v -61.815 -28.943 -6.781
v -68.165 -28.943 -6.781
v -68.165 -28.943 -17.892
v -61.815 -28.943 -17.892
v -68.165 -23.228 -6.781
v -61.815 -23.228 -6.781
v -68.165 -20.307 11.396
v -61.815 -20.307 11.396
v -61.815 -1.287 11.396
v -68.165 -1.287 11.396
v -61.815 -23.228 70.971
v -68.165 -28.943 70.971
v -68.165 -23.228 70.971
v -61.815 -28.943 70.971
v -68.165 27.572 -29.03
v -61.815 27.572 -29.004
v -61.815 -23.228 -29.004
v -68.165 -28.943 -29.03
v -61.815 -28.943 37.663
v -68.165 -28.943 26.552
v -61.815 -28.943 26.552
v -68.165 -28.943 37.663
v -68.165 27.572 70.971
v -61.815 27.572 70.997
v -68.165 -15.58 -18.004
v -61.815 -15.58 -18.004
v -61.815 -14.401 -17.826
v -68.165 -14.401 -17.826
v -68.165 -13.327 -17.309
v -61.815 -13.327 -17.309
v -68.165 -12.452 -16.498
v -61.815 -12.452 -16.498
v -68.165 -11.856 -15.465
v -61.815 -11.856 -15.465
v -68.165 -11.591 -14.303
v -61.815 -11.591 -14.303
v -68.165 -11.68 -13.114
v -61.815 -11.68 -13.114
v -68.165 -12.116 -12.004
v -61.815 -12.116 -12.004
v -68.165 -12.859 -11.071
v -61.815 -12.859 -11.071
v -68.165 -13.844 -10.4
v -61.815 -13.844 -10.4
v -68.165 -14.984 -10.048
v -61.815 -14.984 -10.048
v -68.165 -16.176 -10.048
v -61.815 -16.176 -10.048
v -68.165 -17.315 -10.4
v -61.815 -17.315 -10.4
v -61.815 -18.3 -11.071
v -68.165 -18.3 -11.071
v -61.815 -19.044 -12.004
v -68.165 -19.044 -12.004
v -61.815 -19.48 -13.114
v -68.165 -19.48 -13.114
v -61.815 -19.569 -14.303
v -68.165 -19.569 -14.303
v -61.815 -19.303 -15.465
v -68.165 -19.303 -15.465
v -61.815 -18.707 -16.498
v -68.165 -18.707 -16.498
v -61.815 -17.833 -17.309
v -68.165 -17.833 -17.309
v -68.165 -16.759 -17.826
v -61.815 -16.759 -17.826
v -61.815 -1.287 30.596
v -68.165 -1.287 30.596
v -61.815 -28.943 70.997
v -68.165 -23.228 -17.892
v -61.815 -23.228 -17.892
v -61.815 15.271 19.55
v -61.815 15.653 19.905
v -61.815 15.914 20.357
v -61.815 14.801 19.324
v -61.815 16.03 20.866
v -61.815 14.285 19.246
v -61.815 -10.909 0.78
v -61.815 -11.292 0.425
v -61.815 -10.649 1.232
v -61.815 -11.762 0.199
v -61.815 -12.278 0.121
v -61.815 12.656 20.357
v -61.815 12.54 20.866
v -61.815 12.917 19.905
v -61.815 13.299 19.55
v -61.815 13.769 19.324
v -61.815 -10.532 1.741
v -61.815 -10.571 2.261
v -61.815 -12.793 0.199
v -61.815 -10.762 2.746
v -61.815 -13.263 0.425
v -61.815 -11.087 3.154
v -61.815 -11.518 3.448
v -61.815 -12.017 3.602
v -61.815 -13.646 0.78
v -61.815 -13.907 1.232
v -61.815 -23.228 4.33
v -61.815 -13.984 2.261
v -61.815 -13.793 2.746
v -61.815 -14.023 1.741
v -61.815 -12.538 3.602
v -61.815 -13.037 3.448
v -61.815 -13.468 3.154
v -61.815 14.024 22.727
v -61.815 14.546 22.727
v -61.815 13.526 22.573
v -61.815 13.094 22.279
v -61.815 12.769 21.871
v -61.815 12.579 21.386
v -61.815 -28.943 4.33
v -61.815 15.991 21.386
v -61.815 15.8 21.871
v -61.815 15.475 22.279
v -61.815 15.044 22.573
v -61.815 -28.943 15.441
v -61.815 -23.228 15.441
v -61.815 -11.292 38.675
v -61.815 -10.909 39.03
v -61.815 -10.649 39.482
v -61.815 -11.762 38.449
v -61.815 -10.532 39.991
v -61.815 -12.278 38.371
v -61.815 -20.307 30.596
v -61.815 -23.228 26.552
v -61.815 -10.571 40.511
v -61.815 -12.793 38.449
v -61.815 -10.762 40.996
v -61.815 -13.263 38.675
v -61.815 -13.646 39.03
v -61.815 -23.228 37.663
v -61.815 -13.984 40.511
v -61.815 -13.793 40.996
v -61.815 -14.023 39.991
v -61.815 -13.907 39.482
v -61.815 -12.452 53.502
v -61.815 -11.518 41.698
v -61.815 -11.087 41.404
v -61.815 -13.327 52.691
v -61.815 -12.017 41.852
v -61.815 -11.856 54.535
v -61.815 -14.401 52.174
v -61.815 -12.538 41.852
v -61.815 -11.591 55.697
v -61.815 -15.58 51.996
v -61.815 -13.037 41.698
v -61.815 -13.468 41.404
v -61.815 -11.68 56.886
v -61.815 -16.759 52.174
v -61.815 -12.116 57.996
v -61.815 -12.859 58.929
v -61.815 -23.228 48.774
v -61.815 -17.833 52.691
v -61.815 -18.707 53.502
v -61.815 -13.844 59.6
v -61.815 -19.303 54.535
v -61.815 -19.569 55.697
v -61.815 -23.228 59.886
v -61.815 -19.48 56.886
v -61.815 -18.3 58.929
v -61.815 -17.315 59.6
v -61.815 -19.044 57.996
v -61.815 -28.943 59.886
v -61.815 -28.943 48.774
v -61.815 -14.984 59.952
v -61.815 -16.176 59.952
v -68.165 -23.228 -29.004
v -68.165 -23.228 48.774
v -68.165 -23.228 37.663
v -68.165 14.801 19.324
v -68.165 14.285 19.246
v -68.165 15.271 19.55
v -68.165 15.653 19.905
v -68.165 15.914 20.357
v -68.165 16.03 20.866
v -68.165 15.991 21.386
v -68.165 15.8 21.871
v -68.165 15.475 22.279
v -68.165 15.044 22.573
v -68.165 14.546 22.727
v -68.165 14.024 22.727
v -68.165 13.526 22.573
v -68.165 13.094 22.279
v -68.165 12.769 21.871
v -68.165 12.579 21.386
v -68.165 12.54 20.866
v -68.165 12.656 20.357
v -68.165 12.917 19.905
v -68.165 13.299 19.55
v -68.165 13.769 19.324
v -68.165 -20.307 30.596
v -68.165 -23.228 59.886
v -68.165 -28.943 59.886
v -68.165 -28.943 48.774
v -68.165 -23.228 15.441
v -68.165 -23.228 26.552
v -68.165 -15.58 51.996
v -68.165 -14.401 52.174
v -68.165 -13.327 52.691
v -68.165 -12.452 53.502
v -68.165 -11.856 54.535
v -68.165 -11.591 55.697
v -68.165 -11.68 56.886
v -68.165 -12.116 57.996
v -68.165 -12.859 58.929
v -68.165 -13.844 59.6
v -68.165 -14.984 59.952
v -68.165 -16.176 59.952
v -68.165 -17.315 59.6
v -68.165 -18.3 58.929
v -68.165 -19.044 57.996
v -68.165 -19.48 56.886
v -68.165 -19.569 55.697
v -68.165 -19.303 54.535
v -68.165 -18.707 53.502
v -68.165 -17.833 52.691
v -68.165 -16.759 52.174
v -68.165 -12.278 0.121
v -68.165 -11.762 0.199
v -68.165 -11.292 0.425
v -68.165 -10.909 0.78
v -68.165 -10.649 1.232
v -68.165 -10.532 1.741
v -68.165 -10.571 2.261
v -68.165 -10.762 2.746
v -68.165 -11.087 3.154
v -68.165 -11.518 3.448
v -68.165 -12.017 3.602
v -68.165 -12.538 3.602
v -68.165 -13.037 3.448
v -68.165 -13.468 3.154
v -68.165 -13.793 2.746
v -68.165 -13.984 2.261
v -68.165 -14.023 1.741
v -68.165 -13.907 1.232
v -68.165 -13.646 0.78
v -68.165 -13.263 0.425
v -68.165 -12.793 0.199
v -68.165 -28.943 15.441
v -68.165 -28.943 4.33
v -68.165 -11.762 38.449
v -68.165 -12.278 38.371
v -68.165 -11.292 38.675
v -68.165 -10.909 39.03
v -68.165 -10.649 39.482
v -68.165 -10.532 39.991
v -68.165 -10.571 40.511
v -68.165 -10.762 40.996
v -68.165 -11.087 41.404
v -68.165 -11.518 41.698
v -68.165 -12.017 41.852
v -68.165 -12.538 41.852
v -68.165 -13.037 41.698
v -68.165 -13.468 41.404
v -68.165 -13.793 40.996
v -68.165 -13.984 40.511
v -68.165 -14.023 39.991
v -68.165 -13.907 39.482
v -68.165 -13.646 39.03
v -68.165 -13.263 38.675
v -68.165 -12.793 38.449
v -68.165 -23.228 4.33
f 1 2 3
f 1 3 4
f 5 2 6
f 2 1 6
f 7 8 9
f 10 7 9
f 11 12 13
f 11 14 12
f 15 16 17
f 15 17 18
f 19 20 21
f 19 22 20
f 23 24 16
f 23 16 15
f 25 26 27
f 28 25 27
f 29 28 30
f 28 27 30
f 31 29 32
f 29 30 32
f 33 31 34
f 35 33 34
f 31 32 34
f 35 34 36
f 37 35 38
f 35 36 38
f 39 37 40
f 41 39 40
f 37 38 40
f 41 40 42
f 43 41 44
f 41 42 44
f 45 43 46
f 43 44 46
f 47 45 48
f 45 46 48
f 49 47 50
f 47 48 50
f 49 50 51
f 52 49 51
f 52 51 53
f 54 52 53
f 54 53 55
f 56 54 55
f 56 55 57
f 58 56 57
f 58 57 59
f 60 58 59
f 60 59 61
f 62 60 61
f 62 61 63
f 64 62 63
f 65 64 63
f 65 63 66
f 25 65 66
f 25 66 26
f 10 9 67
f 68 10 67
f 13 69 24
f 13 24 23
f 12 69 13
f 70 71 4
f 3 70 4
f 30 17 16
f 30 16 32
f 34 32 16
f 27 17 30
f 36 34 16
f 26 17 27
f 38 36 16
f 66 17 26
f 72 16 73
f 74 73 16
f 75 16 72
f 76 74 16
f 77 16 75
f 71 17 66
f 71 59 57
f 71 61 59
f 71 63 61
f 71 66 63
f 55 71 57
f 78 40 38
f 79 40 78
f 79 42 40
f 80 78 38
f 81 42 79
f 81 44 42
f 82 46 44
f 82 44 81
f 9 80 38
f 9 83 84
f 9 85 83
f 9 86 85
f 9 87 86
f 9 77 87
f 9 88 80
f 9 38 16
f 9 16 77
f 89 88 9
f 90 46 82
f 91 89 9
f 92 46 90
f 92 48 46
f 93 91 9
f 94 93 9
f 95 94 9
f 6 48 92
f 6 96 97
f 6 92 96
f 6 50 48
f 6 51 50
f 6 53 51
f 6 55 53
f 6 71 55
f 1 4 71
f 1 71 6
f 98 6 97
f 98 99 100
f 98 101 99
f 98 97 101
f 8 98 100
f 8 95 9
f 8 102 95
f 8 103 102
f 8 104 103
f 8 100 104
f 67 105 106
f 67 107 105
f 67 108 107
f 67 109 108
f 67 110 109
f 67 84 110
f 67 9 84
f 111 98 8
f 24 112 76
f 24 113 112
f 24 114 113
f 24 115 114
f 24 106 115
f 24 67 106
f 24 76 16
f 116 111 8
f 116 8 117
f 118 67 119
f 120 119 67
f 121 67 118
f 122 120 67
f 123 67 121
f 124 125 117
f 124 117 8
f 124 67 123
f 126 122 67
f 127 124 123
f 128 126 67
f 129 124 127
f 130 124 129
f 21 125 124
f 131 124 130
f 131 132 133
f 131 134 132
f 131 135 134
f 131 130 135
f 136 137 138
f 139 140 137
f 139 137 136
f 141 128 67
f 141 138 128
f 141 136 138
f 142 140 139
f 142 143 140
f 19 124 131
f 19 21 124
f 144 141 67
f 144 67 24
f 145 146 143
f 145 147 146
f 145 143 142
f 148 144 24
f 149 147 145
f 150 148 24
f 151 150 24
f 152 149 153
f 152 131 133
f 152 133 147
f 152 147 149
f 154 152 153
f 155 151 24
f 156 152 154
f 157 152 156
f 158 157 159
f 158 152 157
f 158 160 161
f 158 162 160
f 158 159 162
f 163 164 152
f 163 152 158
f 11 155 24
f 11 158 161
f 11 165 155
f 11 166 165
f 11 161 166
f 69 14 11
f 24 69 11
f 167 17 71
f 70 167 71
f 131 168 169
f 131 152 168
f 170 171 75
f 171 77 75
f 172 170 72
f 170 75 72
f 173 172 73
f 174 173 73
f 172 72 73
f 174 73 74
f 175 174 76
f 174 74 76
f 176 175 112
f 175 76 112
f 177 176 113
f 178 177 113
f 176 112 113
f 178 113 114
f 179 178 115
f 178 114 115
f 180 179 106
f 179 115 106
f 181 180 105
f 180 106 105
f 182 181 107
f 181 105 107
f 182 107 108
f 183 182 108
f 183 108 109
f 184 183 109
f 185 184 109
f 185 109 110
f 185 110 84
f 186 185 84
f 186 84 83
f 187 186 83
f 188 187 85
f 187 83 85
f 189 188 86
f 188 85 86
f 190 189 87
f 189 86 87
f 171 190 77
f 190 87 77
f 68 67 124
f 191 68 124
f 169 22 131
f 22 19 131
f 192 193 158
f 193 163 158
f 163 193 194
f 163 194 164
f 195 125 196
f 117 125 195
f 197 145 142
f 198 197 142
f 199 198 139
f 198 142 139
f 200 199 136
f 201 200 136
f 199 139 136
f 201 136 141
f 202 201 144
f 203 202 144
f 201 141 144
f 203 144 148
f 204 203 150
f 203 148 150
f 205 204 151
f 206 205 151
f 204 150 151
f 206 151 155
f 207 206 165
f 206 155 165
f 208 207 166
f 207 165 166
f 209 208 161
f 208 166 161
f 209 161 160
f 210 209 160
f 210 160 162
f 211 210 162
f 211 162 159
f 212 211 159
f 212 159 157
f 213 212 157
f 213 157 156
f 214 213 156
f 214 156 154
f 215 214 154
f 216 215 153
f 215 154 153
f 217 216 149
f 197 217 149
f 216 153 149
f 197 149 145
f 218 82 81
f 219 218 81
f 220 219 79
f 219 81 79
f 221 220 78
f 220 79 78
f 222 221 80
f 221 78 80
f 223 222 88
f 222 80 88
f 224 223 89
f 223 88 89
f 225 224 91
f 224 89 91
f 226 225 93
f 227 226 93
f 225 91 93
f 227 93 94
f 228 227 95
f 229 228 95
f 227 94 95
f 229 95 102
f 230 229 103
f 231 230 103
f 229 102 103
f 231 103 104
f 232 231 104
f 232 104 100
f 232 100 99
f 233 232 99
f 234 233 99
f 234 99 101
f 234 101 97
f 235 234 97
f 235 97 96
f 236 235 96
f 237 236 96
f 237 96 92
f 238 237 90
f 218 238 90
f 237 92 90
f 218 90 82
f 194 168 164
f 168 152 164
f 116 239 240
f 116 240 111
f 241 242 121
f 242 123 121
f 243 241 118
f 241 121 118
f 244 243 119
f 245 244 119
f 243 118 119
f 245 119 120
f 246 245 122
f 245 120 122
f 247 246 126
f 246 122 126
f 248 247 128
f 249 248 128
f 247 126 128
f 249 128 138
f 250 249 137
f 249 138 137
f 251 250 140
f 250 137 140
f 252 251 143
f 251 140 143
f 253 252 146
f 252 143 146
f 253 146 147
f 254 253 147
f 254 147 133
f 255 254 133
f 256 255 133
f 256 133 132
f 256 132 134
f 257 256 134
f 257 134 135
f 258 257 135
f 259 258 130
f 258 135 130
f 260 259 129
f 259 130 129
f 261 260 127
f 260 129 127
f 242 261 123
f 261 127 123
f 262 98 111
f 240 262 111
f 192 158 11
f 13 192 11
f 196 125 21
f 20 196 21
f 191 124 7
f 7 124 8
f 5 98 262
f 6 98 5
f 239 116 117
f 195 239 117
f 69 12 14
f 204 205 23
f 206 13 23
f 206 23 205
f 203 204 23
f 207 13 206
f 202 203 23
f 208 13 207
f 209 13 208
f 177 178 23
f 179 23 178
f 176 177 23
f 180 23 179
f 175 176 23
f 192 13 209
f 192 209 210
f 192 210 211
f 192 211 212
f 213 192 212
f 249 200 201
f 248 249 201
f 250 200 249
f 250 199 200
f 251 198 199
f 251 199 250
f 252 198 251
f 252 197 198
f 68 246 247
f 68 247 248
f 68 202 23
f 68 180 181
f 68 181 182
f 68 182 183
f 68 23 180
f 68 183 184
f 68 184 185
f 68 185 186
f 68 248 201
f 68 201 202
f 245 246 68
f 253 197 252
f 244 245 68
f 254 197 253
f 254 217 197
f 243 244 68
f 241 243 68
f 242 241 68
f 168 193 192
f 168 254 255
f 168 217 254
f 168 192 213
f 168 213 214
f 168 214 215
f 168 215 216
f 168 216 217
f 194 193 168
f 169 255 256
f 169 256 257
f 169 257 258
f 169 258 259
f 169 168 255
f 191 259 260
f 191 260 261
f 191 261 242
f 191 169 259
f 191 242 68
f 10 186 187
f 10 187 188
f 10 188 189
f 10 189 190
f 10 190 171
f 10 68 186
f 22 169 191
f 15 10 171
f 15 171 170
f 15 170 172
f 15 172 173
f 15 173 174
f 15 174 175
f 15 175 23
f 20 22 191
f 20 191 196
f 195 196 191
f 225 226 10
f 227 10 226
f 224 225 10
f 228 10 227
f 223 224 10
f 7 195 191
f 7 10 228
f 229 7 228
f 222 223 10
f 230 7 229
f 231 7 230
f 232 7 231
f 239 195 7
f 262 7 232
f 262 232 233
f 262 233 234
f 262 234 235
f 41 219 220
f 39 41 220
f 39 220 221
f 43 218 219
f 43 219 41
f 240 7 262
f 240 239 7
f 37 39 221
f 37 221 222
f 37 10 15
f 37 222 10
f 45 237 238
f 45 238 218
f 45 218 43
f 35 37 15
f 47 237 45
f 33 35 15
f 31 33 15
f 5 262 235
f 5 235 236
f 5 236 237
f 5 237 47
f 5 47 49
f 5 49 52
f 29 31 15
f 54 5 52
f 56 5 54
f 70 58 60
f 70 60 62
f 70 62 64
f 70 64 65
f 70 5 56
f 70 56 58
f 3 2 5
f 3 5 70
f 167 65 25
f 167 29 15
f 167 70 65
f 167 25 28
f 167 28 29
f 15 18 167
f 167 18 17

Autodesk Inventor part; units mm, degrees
ref_plane "YZ Plane" through (0, 0, 0) normal (1, 0, 0) x (0, 1, 0)
ref_plane "XZ Plane" through (0, 0, 0) normal (0, 1, 0) x (-1, 0, 0)
ref_plane "Work Plane1" through (-108.8053, -23.2276, 20.9918) normal (0, 1, 0) x (-0.9999918, 0, -0.00406)
sketch "Sketch1" plane through (-108.8053, -23.2276, 20.9918) normal (0, 1, 0) x (-0.9999918, 0, -0.00406)
  line L0 (-46.787, -50.1863) -> (-47.193, 49.8137)
  line L1 (-47.193, 49.8137) -> (-40.843, 49.8137)
  line L2 (-46.787, -50.1863) -> (-40.437, -50.1863)
  line L3 (-46.787, -50.1863) -> (-40.437, -50.1863)
  line L4 (-40.843, 49.8137) -> (-40.437, -50.1863)
  line L5 (-47.193, 49.8137) -> (46.787, 50.1953) construction
  line L6 (-38.1849, 20.7247) -> (-38.1707, 17.2247)
  line L7 (-38.0296, -17.525) -> (-38.0154, -21.025)
  point P0 (-108.7192, -21.4334)
  dimension "d0" = 6.35
  dimension "d1" = 6.35
extrude "Extrusion1" add sketch "Sketch1" along normal blind 50.8 and the other way blind 6.35
sketch "Sketch2" plane through (-61.8149, -29.5776, 70.9967) normal (1, 0, 0) x (0, 0, -1)
  line L0 (100.0008, 0) -> (100.0008, 57.15) construction
  line L1 (0, 57.15) -> (100.0008, 57.15) construction
  line L2 (0, 0) -> (0, 57.15) construction
  line L3 (0, 57.15) -> (100.0008, 57.15) construction
  line L4 (50.0004, 57.15) -> (50.0004, 0) construction
  circle A0 centre (15.0004, 13.9978) radius 4
  circle A1 centre (85.0004, 13.9978) radius 4
  line L5 (40.4004, 9.271) -> (59.6004, 9.271)
  line L6 (59.6004, 9.271) -> (59.6004, 28.291)
  line L7 (59.6004, 28.291) -> (40.4004, 28.291)
  line L8 (40.4004, 28.291) -> (40.4004, 9.271)
  line L9 (21.3504, 9.271) -> (21.3504, 25.4) construction
  line L10 (21.3504, 20.3478) -> (13.3504, 20.3478) construction
  line L11 (21.3504, 9.271) -> (21.3504, 25.4) projected
  line L12 (78.6504, 9.271) -> (78.6504, 25.4) projected
  line L13 (11.1112, 0.635) -> (11.1112, 6.35)
  line L14 (22.2224, 6.35) -> (22.2224, 0.635)
  line L15 (33.3334, 0.635) -> (33.3334, 6.35)
  line L16 (44.4446, 6.35) -> (44.4446, 0.635)
  line L17 (55.5556, 0.635) -> (55.5556, 6.35)
  line L18 (66.6668, 6.35) -> (66.6668, 0.635)
  line L19 (88.8891, 6.35) -> (88.8891, 0.635)
  line L20 (77.7779, 0.635) -> (77.7779, 6.35)
  line L21 (0.0258, 0.635) -> (0.0258, 6.35) construction
  line L22 (0.0258, 57.15) -> (0.0258, 0.635) construction
  line L23 (88.8891, 0.635) -> (100.0266, 0.635)
  line L24 (100.0008, 6.35) -> (88.8891, 6.35)
  line L25 (77.7779, 0.635) -> (66.6668, 0.635)
  line L26 (66.6668, 6.35) -> (77.7779, 6.35)
  line L27 (55.5556, 0.635) -> (44.4446, 0.635)
  line L28 (44.4446, 6.35) -> (55.5556, 6.35)
  line L29 (33.3334, 0.635) -> (22.2224, 0.635)
  line L30 (22.2224, 6.35) -> (33.3334, 6.35)
  line L31 (11.1112, 0.635) -> (0.0258, 0.635)
  line L32 (11.1112, 6.35) -> (0.0258, 6.35)
  line L33 (0.0258, 0.635) -> (0.0258, 6.35)
  line L34 (100.0266, 0.635) -> (100.0008, 6.35)
  line L35 (59.6004, 9.271) -> (59.6004, 25.4) projected
  line L36 (40.4004, 9.271) -> (40.4004, 25.4) projected
  circle A2 centre (30.8754, 17.3) radius 1.75
  circle A3 centre (69.1254, 17.3) radius 1.75
  circle A4 centre (50.0004, 43.8624) radius 1.75
  point P0 (70.9967, 23.2276)
  point P1 (75.0381, 0)
  dimension "d9" = 8
  dimension "d10" = 8
  dimension "d13" = 35
  dimension "d14" = 8
  dimension "d26" = 5.715
  dimension "d27" = 5.715
  dimension "d28" = 5.715
  dimension "d29" = 5.715
  dimension "d30" = 5.715
extrude "Extrusion2" cut sketch "Sketch2" against normal blind 35
sketch "Sketch4" plane through (-108.8053, -29.5776, 20.9918) normal (0, -1, 0) x (0.9999918, 0, 0.00406)
  line L0 (46.787, -50.1863) -> (47.193, 49.8137) projected
  line L1 (47.193, 49.8137) -> (40.843, 49.8137) projected
  line L2 (40.843, 49.8137) -> (40.437, -50.1863) projected
  line L3 (40.437, -50.1863) -> (46.787, -50.1863) projected
  point P0 (108.7192, -21.4334)
extrude "Extrusion3" cut sketch "Sketch4" against normal up to surface (0.635 mm away)
equation "\"d27\" = d26"
equation "\"d28\" = d26"
equation "\"d29\" = d26"
equation "\"d30\" = d26"
equation "\"d11\" = d13"
